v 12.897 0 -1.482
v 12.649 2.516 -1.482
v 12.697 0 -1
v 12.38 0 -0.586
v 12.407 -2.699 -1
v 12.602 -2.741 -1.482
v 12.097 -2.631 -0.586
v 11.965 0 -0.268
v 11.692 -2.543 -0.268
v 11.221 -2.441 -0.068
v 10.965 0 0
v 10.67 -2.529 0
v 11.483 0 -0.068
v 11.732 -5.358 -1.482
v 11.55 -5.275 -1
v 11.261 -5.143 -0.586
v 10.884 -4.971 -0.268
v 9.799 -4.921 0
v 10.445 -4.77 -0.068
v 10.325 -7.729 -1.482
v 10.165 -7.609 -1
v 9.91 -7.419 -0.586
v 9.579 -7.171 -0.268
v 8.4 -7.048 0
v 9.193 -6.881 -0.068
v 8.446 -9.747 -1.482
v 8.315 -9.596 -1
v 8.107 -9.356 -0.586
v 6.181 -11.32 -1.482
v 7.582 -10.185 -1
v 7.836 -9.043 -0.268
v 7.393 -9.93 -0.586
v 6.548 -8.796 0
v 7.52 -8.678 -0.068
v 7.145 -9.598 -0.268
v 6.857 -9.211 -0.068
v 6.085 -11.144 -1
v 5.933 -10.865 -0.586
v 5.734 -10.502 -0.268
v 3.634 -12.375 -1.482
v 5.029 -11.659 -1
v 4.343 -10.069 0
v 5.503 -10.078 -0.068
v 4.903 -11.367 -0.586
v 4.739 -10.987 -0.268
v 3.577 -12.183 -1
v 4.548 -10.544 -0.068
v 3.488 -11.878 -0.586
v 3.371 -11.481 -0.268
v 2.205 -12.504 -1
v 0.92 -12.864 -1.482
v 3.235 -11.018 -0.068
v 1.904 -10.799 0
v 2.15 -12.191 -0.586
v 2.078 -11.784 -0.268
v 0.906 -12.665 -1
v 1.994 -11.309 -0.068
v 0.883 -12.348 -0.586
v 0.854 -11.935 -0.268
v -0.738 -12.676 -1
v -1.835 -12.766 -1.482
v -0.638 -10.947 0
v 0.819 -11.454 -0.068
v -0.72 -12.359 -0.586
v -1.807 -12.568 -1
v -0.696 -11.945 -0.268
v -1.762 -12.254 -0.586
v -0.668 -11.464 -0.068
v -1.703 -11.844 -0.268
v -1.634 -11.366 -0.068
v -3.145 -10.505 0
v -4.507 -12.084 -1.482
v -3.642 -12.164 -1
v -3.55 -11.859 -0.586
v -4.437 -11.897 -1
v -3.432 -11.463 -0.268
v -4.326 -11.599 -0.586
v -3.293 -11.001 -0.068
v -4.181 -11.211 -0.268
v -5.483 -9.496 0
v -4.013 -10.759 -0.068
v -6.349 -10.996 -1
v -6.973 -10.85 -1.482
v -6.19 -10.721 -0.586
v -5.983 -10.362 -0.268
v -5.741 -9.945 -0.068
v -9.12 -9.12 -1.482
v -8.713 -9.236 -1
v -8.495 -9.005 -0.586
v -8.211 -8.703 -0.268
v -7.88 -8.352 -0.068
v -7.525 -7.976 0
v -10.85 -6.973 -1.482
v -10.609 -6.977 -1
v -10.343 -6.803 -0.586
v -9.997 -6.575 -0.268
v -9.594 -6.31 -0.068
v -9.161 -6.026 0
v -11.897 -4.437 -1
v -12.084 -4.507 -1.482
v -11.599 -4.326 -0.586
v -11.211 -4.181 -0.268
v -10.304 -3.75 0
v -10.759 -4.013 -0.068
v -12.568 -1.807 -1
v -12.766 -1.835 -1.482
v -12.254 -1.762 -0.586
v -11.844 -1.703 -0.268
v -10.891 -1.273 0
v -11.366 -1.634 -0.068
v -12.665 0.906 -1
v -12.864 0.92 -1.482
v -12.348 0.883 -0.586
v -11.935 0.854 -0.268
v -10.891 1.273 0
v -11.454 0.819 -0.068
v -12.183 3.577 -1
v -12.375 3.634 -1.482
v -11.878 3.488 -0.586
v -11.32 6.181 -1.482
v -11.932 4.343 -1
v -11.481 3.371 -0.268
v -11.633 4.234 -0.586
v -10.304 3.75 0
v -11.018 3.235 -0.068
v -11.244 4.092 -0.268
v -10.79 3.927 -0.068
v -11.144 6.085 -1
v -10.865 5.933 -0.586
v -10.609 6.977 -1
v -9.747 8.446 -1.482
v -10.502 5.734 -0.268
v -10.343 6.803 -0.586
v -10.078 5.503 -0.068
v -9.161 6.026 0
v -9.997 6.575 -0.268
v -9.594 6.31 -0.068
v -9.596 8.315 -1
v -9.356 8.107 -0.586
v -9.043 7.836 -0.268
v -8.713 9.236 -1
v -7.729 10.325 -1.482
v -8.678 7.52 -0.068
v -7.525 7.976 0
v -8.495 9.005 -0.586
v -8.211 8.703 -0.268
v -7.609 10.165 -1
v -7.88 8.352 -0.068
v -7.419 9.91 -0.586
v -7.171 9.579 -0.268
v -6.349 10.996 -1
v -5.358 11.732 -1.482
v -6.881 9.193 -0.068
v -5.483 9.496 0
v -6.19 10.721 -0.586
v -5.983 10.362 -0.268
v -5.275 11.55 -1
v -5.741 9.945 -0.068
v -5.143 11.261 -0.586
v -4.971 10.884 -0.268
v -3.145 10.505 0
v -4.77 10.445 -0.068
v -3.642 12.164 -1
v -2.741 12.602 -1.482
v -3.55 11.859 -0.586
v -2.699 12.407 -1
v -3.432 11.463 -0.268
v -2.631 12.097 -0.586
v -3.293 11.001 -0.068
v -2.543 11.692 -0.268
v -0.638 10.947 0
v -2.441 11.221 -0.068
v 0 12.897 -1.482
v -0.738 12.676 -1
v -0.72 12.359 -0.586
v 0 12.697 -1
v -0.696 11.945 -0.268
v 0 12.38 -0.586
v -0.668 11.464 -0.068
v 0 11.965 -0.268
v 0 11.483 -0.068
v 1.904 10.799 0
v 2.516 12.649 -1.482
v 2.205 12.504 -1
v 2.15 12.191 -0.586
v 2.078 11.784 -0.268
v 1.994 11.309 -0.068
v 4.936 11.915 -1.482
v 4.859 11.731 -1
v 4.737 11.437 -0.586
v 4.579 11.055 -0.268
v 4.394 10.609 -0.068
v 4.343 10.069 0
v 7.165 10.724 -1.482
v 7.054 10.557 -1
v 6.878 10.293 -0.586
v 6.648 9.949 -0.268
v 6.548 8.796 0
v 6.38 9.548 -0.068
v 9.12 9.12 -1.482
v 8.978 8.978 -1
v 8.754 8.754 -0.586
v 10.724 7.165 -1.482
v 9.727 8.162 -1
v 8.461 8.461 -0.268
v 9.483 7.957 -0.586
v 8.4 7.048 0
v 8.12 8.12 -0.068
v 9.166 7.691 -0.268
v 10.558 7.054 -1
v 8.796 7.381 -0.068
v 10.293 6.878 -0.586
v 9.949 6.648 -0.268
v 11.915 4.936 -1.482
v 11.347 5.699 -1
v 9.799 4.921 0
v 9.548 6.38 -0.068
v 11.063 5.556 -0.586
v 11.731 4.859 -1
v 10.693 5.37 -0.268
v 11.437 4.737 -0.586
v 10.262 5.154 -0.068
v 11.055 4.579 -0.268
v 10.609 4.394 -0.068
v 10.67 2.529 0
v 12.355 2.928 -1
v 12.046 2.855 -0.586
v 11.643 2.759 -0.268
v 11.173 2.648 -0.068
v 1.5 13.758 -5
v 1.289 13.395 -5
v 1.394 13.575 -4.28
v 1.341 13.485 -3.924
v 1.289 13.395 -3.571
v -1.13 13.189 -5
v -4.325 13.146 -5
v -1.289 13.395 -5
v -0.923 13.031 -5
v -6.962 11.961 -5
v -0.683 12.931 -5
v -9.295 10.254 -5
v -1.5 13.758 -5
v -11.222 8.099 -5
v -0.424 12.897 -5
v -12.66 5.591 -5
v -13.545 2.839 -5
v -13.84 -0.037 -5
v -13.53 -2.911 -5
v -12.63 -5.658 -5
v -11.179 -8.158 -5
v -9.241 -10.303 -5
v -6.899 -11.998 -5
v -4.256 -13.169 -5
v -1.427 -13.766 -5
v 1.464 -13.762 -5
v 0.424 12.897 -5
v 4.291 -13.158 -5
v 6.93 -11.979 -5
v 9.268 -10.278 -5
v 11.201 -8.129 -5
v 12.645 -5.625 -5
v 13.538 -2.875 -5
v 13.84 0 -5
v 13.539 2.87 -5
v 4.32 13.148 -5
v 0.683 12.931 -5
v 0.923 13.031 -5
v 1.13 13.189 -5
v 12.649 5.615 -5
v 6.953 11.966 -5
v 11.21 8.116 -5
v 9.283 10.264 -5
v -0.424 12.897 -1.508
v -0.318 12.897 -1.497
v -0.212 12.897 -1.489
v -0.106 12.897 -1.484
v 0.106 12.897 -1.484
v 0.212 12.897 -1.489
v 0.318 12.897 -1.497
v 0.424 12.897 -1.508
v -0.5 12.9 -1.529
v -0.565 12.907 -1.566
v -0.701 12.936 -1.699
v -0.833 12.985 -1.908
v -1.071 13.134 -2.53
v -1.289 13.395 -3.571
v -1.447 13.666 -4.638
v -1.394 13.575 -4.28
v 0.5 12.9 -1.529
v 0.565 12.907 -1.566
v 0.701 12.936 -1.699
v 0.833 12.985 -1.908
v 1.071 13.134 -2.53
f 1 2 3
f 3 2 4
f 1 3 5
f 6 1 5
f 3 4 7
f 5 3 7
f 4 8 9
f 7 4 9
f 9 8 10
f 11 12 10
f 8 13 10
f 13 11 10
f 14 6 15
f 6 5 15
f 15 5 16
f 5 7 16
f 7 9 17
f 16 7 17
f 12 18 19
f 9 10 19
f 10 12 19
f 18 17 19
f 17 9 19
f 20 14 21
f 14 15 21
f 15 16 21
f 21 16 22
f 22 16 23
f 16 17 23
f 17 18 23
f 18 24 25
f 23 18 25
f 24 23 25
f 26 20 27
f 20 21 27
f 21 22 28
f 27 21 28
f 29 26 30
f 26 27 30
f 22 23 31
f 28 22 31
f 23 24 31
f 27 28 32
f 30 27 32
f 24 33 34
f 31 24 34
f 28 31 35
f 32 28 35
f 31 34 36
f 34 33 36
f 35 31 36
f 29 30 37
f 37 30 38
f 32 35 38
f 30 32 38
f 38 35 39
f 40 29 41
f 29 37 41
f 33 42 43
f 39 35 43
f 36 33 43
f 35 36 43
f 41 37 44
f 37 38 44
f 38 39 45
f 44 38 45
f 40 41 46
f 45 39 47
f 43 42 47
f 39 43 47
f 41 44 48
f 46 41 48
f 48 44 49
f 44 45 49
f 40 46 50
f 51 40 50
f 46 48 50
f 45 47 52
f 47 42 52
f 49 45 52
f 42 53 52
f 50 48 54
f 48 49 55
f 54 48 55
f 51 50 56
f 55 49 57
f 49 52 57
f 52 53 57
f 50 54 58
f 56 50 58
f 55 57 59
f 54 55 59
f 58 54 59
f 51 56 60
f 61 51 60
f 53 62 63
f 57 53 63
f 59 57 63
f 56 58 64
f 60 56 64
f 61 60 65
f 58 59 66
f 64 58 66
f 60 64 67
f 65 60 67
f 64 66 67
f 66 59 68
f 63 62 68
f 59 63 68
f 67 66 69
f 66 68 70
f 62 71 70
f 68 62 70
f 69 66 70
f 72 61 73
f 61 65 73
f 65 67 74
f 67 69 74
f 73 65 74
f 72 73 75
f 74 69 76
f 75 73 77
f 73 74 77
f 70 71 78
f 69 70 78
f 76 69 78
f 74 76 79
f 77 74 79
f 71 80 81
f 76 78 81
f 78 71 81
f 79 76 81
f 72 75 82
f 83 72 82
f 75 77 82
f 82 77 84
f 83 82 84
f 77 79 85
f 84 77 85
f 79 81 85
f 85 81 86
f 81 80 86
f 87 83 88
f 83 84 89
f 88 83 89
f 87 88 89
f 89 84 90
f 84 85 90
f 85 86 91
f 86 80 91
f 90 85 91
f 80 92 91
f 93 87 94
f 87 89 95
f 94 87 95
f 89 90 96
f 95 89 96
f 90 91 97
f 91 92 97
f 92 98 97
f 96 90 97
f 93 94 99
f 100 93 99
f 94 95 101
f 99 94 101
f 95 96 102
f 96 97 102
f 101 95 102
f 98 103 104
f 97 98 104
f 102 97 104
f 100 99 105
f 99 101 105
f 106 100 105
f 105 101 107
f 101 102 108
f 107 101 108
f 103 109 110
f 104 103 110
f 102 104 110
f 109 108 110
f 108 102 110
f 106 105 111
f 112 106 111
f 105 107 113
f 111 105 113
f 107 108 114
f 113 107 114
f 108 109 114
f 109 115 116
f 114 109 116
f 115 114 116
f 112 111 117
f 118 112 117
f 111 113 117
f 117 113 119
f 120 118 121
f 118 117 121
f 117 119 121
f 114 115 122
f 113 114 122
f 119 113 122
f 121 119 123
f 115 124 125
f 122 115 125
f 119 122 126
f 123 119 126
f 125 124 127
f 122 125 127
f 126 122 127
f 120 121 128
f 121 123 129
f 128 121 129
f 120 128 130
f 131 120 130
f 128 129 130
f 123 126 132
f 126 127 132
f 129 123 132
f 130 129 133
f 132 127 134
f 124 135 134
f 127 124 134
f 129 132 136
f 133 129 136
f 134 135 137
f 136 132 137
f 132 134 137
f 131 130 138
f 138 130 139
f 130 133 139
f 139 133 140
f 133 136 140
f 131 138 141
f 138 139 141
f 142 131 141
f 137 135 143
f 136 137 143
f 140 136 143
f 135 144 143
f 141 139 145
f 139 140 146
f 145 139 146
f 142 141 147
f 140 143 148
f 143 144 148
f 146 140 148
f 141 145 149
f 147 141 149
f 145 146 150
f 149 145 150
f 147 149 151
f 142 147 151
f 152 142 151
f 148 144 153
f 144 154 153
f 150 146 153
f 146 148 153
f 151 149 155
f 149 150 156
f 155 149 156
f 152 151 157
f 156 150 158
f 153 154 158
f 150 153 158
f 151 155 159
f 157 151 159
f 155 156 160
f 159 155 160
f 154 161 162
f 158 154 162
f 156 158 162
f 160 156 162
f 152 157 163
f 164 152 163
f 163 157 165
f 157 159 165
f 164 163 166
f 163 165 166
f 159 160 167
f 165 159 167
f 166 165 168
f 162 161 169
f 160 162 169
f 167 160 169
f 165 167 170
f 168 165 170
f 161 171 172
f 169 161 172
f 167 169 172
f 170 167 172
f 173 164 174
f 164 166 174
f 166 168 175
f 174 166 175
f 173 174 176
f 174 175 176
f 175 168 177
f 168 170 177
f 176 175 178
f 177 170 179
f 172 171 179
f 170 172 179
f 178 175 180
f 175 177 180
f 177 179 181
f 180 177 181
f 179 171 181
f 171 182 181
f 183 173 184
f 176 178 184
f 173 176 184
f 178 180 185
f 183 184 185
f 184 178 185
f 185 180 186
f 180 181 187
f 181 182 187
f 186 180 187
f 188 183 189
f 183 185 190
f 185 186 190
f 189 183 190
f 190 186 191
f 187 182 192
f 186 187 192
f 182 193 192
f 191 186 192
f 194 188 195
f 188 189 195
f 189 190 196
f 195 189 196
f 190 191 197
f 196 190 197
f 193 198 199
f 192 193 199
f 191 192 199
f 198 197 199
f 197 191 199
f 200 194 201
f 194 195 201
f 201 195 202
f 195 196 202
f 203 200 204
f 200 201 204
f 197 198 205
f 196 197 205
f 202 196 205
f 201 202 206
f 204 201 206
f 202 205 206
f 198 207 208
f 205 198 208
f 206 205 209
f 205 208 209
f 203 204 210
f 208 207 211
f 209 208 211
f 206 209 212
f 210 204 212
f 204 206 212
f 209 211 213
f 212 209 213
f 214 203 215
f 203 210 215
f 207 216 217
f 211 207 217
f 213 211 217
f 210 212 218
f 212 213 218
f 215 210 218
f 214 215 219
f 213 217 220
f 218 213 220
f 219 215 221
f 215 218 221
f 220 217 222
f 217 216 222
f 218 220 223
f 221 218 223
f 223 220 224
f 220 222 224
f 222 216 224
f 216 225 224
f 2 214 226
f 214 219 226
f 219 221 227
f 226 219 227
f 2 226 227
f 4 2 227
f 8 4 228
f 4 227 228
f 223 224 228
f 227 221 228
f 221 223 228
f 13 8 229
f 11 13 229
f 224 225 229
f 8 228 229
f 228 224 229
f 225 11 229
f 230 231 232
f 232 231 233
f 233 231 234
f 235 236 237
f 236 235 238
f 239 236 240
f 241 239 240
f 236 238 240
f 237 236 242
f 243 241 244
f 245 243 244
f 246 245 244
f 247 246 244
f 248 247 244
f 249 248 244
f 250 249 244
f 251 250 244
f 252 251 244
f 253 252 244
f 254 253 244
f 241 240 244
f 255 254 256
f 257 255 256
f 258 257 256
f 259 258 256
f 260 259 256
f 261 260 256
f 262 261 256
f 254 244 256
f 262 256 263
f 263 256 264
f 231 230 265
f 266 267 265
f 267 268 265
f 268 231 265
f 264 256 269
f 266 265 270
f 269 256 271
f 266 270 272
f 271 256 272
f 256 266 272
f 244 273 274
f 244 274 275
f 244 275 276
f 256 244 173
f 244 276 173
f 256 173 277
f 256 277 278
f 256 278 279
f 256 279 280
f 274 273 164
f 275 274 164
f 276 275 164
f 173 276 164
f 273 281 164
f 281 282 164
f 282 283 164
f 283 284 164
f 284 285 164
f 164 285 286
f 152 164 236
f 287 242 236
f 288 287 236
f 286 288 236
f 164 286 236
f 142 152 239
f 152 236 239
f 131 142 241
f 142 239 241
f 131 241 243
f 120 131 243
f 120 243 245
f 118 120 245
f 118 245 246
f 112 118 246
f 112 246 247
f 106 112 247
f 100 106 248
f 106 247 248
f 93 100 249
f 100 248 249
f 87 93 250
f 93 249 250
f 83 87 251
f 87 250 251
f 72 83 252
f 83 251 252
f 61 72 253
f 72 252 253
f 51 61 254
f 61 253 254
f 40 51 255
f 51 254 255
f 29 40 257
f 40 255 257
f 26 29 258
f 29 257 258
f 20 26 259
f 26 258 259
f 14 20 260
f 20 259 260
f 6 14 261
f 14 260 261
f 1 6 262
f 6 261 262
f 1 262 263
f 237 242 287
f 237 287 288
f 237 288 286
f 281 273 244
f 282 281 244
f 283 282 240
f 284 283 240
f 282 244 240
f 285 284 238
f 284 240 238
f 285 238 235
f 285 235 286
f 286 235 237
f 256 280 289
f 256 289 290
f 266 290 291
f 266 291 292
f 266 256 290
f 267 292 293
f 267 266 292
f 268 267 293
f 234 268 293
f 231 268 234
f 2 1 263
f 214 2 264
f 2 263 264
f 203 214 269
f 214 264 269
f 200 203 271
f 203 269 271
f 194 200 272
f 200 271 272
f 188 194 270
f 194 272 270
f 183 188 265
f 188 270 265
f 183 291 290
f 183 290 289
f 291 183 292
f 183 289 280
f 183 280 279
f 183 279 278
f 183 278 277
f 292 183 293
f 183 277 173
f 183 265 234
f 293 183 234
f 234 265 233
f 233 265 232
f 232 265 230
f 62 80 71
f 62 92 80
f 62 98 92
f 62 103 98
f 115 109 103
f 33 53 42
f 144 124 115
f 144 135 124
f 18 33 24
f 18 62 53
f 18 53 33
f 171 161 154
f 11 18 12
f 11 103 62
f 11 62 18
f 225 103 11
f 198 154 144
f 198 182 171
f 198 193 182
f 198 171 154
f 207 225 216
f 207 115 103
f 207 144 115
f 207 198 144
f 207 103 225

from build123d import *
from build123d import SkipClean  # not in build123d's __all__

# Parameters (mm, degrees)
F0_R     = 12.5
F1_DEPTH = 5
F1_TAPER = -15
F2_R     = 2
F4_DEPTH = 25
F5_R     = 1


with BuildPart() as f1:
    # F0 (on Top) → F1 (new body)
    with BuildSketch(Plane.XY):
        Circle(F0_R)
    extrude(amount=-F1_DEPTH, taper=F1_TAPER)

    # F2
    f2_edges = [f1.edges().sort_by_distance(p)[0] for p in [
        (-12.5, 0, 0),
    ]]
    fillet(f2_edges, radius=F2_R)

    # F3 (on Top) → F4 (cut)
    with BuildSketch(Plane.XY):
        with BuildLine():
            ThreePointArc((1.5, 13.7582182094), (0, 13.8397459622), (-1.5, 13.7582182094))
            Line((-1.5, 13.7582182094), (-1, 12.8971976766))
            Line((-1, 12.8971976766), (1, 12.8971976766))
            Line((1, 12.8971976766), (1.5, 13.7582182094))
        make_face()
    with SkipClean():  # cleaning this boolean's faces spoils the solid; the shape is the same uncleaned
        extrude(amount=-F4_DEPTH, mode=Mode.SUBTRACT)

    # F5
    f5_edges = [f1.edges().sort_by_distance(p)[0] for p in [
        (-1, 12.897198, -3.313415),
        (1, 12.897198, -3.313415),
    ]]
    fillet(f5_edges, radius=F5_R)


solid = f1.part
